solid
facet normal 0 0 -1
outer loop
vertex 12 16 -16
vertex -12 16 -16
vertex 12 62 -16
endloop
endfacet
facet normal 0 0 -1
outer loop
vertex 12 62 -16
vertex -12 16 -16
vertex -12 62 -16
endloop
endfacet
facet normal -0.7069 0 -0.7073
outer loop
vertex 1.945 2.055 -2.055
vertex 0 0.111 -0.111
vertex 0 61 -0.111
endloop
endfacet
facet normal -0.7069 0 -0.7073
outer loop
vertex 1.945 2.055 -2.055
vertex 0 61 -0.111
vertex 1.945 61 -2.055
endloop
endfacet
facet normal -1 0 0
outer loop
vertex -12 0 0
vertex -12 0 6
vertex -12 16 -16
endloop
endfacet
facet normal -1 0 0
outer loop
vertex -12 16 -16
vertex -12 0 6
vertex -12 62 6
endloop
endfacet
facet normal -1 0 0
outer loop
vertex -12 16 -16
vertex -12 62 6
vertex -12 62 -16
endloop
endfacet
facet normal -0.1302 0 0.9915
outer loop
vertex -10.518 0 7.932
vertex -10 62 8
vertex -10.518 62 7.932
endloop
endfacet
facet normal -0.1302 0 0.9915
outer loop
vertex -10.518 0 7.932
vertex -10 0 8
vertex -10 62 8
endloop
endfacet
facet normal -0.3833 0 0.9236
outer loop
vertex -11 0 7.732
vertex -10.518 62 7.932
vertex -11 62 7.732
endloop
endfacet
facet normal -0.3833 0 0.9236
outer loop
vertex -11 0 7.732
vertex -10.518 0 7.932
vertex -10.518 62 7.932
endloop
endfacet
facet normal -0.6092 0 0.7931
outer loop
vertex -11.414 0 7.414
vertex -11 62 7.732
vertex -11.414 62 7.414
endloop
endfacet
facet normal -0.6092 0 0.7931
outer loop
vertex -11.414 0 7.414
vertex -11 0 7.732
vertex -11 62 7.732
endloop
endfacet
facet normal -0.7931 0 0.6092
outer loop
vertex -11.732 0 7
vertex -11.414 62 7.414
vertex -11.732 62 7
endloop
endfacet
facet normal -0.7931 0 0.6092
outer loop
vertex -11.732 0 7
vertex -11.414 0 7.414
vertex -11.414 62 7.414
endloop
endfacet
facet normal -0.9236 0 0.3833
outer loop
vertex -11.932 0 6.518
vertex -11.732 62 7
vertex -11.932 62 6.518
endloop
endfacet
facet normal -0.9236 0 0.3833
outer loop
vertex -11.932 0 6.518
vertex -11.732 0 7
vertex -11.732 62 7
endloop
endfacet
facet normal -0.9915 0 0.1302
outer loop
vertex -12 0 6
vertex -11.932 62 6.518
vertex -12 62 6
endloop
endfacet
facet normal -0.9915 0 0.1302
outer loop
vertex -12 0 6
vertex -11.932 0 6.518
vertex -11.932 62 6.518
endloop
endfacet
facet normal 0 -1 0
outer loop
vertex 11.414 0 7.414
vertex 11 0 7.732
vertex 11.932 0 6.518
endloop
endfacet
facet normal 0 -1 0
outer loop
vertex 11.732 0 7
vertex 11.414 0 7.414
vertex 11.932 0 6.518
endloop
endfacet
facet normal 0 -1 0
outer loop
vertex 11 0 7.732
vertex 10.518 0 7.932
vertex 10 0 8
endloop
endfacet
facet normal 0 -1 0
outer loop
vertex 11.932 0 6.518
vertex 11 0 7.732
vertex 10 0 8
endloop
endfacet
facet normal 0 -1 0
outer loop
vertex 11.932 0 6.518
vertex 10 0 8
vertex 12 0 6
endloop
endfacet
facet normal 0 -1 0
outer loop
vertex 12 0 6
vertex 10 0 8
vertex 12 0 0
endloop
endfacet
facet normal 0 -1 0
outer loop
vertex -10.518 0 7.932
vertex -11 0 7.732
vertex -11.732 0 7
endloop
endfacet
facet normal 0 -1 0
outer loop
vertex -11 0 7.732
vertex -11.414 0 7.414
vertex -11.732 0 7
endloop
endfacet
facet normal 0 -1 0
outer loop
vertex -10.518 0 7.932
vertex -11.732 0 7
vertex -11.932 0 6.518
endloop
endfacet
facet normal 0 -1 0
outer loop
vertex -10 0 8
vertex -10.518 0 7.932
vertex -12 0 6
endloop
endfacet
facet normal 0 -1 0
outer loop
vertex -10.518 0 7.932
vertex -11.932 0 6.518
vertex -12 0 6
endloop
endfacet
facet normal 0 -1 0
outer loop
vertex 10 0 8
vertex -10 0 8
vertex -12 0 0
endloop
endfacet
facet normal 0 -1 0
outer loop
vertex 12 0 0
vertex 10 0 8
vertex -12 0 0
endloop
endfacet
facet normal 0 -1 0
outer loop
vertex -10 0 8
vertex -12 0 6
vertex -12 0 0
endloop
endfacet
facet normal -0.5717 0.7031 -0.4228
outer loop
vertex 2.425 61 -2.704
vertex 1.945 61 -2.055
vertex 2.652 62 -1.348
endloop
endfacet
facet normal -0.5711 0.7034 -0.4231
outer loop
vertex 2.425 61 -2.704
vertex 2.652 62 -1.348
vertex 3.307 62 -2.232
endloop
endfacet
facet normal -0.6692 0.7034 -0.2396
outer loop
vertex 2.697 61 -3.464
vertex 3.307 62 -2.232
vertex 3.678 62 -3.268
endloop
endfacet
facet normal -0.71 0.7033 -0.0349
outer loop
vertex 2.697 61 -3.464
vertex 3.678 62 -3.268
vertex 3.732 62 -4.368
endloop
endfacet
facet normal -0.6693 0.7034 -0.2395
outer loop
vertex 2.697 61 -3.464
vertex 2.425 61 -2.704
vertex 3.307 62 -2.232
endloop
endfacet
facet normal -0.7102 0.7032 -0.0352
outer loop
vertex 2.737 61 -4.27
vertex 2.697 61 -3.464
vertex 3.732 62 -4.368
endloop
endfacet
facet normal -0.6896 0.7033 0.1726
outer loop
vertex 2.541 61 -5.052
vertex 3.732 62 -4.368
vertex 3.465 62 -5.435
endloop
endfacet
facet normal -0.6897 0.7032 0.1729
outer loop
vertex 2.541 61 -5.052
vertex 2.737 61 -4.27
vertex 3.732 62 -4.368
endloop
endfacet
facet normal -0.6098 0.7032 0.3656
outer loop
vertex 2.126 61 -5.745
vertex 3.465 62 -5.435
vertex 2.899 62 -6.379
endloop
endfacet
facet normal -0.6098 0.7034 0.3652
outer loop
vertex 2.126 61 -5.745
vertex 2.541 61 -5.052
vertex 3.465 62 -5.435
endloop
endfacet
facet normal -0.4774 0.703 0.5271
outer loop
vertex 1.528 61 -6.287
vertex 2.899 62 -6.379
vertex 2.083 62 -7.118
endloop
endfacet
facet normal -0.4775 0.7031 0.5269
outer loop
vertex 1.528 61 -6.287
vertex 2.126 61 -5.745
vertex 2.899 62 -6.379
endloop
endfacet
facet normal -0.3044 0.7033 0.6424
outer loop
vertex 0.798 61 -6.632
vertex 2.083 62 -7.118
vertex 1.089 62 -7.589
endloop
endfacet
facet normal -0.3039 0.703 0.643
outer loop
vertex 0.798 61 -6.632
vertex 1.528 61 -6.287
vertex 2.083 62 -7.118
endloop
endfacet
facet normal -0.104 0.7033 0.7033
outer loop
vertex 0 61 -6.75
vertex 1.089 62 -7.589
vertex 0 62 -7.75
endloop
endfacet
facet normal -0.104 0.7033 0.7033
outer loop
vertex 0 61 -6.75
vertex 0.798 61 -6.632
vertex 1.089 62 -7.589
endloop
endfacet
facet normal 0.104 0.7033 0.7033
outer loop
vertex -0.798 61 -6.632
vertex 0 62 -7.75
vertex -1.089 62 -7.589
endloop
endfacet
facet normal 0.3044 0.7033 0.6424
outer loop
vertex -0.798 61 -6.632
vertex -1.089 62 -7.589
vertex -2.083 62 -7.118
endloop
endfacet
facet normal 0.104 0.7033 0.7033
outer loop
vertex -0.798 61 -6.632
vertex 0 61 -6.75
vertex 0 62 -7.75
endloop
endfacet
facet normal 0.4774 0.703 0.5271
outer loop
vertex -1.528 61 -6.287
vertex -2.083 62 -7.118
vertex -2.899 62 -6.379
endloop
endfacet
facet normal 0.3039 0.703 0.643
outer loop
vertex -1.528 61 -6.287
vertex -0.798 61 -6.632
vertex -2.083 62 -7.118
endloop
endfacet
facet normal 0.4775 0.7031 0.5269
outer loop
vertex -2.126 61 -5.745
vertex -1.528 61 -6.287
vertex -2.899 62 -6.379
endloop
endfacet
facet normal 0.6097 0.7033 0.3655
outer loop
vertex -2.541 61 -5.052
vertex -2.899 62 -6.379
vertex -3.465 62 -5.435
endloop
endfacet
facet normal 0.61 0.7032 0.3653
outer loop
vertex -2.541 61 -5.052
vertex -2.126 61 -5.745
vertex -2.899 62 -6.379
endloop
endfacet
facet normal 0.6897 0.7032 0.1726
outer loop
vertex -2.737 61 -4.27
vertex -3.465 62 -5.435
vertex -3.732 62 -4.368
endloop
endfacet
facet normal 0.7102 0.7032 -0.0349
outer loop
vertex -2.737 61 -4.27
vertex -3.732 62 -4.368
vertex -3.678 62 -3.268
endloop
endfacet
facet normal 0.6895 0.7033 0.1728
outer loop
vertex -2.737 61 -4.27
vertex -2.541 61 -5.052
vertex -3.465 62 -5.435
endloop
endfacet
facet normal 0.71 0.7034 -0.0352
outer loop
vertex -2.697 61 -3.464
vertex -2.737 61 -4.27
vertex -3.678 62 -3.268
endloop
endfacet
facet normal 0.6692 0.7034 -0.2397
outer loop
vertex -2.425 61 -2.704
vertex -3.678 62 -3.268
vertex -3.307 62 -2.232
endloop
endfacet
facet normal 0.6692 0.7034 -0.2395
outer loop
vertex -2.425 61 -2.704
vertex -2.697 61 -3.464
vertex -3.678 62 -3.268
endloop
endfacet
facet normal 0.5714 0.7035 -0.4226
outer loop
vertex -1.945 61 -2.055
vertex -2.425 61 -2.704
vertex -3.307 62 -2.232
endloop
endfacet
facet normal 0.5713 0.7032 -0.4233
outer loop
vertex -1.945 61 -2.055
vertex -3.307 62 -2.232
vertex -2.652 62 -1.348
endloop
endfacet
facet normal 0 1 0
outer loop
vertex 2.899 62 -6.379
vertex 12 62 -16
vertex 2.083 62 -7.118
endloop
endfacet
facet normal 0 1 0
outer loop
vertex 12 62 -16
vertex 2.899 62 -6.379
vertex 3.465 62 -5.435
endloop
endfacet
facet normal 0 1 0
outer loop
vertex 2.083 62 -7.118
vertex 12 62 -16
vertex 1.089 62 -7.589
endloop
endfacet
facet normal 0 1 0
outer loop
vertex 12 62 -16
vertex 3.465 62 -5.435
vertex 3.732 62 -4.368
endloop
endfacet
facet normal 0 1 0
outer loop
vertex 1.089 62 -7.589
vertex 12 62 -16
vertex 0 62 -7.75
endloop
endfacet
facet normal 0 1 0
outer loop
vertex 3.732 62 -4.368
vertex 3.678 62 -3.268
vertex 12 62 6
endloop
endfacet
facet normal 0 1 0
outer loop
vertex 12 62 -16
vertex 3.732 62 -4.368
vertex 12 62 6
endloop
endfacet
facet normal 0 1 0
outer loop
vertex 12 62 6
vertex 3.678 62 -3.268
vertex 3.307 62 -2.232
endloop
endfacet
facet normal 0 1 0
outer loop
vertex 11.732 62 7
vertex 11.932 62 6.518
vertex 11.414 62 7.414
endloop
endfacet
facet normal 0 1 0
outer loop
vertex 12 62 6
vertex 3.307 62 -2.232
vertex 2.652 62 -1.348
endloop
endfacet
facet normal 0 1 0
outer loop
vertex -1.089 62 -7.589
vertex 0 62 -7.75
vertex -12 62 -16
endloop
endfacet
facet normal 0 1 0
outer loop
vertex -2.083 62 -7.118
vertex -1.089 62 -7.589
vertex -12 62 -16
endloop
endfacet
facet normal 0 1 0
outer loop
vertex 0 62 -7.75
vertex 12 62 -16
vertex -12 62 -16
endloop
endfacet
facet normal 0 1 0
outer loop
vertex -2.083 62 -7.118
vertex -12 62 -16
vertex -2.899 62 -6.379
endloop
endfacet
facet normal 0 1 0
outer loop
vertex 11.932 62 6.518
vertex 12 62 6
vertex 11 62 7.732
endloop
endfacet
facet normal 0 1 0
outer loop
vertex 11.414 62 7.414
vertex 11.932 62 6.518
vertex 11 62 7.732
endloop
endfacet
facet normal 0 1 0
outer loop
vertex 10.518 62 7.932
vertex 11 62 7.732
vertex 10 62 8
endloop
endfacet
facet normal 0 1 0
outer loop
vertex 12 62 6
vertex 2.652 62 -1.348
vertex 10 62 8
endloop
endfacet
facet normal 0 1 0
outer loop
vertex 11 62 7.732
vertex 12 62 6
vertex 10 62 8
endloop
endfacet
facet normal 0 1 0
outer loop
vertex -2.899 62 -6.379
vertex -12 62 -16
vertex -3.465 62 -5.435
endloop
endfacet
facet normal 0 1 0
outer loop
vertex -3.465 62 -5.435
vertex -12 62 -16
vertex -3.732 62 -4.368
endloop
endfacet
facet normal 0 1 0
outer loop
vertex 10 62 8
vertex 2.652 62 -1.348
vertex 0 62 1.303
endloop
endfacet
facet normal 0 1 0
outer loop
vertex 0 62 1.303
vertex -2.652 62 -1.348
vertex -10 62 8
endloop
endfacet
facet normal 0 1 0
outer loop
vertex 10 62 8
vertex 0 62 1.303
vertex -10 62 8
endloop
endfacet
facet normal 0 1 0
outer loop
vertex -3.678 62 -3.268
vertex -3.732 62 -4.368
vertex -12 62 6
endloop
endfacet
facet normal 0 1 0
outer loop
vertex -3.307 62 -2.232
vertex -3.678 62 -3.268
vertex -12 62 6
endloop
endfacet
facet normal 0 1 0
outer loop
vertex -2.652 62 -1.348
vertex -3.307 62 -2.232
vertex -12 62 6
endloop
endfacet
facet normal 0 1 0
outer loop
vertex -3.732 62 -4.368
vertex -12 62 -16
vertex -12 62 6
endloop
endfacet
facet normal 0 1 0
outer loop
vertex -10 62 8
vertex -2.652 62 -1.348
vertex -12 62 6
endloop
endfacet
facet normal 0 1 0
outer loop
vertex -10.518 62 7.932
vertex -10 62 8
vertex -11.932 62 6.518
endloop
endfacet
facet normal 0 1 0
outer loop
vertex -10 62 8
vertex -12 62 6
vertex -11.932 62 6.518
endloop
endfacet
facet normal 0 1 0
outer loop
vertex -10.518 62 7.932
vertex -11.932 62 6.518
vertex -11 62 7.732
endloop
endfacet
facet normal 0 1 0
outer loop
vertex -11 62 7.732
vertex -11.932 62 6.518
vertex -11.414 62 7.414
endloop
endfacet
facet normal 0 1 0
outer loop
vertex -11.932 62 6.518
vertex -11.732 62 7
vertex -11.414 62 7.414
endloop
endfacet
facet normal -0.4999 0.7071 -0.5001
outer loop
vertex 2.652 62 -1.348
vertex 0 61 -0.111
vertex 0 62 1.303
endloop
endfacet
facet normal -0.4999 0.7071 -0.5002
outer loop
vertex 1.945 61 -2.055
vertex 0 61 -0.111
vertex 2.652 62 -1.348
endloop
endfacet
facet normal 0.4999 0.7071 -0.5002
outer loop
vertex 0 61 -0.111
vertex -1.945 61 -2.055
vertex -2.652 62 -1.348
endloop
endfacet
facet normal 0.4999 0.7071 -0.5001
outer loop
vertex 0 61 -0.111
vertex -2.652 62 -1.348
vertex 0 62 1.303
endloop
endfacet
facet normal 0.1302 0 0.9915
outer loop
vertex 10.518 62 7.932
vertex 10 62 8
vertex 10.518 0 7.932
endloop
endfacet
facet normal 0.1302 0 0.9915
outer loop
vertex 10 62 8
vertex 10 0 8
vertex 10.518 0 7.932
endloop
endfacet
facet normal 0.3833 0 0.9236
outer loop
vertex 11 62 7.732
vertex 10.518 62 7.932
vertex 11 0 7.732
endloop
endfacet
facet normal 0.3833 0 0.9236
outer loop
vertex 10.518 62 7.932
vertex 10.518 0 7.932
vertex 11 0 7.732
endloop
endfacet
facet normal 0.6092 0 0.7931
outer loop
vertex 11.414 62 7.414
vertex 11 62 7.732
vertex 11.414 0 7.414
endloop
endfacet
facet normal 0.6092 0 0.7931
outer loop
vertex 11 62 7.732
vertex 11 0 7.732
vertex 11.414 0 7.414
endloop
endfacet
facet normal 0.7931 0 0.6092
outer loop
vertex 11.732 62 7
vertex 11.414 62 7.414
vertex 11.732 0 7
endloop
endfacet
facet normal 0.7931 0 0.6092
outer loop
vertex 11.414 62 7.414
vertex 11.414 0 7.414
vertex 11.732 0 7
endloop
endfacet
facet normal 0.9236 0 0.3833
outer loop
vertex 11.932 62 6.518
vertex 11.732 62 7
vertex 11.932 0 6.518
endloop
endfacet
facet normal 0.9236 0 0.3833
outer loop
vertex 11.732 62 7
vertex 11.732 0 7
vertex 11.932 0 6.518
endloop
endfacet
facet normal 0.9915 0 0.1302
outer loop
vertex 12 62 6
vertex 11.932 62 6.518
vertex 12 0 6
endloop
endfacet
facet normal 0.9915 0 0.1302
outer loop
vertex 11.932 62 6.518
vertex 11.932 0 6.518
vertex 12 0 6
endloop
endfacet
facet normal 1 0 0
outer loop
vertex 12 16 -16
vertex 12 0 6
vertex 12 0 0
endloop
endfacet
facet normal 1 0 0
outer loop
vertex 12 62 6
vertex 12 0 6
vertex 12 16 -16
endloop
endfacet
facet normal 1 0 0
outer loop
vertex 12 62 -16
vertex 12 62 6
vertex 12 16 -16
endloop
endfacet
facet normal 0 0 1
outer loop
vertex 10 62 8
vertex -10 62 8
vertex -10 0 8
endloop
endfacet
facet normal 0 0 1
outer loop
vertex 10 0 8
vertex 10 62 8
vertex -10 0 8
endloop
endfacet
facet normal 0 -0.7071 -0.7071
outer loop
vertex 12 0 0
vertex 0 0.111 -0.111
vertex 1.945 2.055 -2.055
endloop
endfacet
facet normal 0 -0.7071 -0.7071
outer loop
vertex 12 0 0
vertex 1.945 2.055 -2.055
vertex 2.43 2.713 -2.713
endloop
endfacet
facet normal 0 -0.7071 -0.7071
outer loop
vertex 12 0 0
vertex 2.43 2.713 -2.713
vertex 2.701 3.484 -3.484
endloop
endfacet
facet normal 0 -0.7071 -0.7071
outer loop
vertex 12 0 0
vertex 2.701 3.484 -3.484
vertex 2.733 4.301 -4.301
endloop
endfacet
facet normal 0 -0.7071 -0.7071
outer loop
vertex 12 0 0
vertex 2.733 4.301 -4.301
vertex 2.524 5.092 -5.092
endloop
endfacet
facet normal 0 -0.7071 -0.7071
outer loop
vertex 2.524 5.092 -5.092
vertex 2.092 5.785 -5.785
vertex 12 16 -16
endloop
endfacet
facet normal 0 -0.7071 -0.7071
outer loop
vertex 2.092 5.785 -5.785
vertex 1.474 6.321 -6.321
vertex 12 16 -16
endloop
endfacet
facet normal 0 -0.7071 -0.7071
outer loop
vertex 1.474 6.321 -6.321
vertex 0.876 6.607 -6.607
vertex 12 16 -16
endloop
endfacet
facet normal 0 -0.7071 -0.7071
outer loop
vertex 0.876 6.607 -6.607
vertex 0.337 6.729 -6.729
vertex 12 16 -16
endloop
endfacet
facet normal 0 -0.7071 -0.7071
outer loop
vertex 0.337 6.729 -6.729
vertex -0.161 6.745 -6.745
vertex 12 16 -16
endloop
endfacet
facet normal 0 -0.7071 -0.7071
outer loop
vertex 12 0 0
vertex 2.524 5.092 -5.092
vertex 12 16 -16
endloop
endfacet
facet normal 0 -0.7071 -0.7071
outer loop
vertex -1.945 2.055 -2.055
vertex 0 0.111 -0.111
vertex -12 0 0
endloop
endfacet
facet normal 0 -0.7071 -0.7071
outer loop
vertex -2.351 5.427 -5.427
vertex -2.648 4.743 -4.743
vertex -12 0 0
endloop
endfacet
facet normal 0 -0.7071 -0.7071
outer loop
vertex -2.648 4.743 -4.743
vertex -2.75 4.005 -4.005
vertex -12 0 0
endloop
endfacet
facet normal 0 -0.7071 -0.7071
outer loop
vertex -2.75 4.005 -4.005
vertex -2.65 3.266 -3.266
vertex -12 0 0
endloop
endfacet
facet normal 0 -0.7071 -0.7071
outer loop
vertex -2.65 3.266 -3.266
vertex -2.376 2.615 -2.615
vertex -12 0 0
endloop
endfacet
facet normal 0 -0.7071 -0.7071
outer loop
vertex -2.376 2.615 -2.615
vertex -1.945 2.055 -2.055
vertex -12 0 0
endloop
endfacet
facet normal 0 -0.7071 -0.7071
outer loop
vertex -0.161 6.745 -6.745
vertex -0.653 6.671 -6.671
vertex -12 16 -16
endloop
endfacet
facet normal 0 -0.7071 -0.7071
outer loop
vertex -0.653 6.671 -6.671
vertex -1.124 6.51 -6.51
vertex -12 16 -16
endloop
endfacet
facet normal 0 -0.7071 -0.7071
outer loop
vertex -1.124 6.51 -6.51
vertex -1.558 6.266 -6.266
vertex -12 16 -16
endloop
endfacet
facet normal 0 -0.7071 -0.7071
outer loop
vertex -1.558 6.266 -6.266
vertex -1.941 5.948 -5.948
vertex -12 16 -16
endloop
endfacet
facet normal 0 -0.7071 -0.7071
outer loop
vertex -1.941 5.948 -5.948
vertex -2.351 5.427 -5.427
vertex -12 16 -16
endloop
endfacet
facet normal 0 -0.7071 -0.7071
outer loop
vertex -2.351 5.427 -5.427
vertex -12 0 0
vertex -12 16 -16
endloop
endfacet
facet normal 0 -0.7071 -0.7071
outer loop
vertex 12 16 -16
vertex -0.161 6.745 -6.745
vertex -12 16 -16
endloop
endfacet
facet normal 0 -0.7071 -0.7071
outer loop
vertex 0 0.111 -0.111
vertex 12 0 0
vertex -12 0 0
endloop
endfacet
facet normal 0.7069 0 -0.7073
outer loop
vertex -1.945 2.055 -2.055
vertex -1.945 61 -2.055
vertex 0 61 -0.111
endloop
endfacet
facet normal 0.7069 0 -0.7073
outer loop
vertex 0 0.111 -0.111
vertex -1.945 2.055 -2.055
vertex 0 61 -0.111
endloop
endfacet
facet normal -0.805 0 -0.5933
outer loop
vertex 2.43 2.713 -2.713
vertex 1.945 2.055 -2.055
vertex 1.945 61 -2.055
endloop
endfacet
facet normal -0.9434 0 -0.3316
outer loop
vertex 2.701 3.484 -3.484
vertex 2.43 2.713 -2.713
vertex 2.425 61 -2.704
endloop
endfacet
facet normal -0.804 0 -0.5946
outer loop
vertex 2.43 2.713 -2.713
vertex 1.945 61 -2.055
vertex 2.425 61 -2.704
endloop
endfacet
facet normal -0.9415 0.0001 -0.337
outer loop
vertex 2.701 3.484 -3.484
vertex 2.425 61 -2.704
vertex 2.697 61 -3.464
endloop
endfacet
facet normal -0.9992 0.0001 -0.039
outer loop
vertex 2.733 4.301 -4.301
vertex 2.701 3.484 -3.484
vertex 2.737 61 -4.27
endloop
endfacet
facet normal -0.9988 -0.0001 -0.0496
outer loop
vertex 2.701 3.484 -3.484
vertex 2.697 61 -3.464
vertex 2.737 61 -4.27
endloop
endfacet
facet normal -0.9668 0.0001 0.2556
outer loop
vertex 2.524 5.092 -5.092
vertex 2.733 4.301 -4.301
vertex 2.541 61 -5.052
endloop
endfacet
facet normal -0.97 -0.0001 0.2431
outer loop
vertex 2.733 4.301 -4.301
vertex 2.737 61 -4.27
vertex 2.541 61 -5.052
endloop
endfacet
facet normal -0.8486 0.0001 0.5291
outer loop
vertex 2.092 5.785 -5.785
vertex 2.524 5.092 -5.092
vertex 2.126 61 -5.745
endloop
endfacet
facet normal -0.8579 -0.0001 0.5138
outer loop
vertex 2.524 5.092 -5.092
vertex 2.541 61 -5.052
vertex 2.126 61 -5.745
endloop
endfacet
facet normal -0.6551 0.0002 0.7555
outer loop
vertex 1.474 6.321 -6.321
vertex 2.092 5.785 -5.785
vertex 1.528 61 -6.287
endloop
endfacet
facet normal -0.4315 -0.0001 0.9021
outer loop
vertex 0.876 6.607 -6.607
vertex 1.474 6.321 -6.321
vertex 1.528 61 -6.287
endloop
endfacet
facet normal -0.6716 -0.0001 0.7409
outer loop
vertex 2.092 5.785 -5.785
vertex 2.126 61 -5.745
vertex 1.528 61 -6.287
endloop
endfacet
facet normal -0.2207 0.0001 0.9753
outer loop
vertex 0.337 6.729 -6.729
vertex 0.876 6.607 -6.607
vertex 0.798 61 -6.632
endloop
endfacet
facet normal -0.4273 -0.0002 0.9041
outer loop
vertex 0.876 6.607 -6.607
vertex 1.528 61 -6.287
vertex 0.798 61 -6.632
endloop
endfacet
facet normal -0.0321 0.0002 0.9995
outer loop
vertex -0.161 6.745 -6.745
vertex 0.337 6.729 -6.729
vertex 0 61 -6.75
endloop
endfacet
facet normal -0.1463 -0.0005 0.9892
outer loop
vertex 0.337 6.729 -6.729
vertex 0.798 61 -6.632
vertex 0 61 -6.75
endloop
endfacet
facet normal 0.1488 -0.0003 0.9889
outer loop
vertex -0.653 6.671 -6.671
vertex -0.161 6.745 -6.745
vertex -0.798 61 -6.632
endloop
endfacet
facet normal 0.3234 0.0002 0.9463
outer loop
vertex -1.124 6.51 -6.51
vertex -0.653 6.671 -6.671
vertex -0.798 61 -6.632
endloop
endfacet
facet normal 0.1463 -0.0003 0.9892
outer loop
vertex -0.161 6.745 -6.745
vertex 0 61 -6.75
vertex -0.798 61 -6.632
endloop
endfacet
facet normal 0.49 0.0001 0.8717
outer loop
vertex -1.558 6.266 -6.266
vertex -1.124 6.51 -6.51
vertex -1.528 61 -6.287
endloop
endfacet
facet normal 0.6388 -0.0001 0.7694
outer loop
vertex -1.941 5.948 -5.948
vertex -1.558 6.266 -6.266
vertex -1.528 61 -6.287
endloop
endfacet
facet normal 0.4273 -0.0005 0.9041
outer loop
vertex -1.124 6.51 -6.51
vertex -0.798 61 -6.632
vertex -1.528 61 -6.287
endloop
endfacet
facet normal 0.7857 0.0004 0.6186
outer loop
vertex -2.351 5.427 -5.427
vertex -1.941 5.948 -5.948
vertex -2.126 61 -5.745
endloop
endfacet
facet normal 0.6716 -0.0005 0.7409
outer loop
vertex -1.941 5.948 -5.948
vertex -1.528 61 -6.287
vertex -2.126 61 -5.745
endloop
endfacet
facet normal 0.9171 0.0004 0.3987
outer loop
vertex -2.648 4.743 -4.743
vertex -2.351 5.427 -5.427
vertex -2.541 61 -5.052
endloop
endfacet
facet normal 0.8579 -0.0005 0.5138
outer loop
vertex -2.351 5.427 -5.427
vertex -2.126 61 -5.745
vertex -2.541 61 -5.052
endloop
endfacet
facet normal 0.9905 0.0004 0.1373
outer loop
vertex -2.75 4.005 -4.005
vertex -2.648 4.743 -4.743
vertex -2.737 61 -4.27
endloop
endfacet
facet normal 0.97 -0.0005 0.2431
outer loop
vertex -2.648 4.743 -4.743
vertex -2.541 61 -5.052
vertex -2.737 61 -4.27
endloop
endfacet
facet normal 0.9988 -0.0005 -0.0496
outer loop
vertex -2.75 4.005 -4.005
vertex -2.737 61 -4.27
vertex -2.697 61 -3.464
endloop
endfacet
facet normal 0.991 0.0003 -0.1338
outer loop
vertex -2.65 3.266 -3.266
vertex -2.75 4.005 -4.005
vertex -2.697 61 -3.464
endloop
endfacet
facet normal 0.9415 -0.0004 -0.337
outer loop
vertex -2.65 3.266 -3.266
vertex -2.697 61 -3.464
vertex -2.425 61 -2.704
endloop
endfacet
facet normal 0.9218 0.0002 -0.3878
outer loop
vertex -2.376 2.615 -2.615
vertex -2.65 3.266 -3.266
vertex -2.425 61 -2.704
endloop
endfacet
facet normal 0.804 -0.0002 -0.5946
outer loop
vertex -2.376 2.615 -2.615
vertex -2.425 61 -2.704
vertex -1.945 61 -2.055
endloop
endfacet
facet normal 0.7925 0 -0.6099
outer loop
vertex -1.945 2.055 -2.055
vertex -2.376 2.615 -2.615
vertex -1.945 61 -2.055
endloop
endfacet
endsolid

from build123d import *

# Parameters (mm, degrees)
BOSS_EXTRUDE1_DEPTH      = 12
BOSS_EXTRUDE1_DEPTH_BACK = 12
FILLET1_R                = 2
CUT_EXTRUDE1_DEPTH       = 66.1459899
CHAMFER1_SIZE            = 1


with BuildPart() as part:
    # Sketch3 → Boss-Extrude1 (new, two sides: drawn at the far end of the back side and taken through both)
    with BuildSketch(Plane(origin=(0, 0, 0), x_dir=(0, 0, -1), z_dir=(1, 0, 0)).offset(-BOSS_EXTRUDE1_DEPTH_BACK)):
        Polygon((0, 62), (-8, 62), (-8, 0), (0, 0), (16, 16), (16, 62), align=None)
    extrude(amount=BOSS_EXTRUDE1_DEPTH + BOSS_EXTRUDE1_DEPTH_BACK)

    # Fillet1
    fillet1_edges = [part.edges().sort_by_distance(p)[0] for p in [
        (-12, 31, 8),
        (12, 31, 8),
    ]]
    fillet(fillet1_edges, radius=FILLET1_R)

    # Sketch4 → Cut-Extrude1 (cut, through all)
    with BuildSketch(Plane(origin=(0, 62, 0), x_dir=(1, 0, 0), z_dir=(0, 1, 0))):
        with BuildLine():
            Line((0, 0.110912703), (1.944543648, 2.055456352))
            ThreePointArc((1.944543648, 2.055456352), (0, 6.75), (-1.944543648, 2.055456352))
            Line((-1.944543648, 2.055456352), (0, 0.110912703))
        make_face()
    extrude(amount=-CUT_EXTRUDE1_DEPTH, mode=Mode.SUBTRACT)

    # Chamfer1
    chamfer1_edges = [part.edges().sort_by_distance(p)[0] for p in [
        (0.972271824, 62, -1.083184528),
        (-0.972271824, 62, -1.083184528),
        (0, 62, -6.75),
    ]]
    chamfer(chamfer1_edges, length=CHAMFER1_SIZE)


solid = part.part
